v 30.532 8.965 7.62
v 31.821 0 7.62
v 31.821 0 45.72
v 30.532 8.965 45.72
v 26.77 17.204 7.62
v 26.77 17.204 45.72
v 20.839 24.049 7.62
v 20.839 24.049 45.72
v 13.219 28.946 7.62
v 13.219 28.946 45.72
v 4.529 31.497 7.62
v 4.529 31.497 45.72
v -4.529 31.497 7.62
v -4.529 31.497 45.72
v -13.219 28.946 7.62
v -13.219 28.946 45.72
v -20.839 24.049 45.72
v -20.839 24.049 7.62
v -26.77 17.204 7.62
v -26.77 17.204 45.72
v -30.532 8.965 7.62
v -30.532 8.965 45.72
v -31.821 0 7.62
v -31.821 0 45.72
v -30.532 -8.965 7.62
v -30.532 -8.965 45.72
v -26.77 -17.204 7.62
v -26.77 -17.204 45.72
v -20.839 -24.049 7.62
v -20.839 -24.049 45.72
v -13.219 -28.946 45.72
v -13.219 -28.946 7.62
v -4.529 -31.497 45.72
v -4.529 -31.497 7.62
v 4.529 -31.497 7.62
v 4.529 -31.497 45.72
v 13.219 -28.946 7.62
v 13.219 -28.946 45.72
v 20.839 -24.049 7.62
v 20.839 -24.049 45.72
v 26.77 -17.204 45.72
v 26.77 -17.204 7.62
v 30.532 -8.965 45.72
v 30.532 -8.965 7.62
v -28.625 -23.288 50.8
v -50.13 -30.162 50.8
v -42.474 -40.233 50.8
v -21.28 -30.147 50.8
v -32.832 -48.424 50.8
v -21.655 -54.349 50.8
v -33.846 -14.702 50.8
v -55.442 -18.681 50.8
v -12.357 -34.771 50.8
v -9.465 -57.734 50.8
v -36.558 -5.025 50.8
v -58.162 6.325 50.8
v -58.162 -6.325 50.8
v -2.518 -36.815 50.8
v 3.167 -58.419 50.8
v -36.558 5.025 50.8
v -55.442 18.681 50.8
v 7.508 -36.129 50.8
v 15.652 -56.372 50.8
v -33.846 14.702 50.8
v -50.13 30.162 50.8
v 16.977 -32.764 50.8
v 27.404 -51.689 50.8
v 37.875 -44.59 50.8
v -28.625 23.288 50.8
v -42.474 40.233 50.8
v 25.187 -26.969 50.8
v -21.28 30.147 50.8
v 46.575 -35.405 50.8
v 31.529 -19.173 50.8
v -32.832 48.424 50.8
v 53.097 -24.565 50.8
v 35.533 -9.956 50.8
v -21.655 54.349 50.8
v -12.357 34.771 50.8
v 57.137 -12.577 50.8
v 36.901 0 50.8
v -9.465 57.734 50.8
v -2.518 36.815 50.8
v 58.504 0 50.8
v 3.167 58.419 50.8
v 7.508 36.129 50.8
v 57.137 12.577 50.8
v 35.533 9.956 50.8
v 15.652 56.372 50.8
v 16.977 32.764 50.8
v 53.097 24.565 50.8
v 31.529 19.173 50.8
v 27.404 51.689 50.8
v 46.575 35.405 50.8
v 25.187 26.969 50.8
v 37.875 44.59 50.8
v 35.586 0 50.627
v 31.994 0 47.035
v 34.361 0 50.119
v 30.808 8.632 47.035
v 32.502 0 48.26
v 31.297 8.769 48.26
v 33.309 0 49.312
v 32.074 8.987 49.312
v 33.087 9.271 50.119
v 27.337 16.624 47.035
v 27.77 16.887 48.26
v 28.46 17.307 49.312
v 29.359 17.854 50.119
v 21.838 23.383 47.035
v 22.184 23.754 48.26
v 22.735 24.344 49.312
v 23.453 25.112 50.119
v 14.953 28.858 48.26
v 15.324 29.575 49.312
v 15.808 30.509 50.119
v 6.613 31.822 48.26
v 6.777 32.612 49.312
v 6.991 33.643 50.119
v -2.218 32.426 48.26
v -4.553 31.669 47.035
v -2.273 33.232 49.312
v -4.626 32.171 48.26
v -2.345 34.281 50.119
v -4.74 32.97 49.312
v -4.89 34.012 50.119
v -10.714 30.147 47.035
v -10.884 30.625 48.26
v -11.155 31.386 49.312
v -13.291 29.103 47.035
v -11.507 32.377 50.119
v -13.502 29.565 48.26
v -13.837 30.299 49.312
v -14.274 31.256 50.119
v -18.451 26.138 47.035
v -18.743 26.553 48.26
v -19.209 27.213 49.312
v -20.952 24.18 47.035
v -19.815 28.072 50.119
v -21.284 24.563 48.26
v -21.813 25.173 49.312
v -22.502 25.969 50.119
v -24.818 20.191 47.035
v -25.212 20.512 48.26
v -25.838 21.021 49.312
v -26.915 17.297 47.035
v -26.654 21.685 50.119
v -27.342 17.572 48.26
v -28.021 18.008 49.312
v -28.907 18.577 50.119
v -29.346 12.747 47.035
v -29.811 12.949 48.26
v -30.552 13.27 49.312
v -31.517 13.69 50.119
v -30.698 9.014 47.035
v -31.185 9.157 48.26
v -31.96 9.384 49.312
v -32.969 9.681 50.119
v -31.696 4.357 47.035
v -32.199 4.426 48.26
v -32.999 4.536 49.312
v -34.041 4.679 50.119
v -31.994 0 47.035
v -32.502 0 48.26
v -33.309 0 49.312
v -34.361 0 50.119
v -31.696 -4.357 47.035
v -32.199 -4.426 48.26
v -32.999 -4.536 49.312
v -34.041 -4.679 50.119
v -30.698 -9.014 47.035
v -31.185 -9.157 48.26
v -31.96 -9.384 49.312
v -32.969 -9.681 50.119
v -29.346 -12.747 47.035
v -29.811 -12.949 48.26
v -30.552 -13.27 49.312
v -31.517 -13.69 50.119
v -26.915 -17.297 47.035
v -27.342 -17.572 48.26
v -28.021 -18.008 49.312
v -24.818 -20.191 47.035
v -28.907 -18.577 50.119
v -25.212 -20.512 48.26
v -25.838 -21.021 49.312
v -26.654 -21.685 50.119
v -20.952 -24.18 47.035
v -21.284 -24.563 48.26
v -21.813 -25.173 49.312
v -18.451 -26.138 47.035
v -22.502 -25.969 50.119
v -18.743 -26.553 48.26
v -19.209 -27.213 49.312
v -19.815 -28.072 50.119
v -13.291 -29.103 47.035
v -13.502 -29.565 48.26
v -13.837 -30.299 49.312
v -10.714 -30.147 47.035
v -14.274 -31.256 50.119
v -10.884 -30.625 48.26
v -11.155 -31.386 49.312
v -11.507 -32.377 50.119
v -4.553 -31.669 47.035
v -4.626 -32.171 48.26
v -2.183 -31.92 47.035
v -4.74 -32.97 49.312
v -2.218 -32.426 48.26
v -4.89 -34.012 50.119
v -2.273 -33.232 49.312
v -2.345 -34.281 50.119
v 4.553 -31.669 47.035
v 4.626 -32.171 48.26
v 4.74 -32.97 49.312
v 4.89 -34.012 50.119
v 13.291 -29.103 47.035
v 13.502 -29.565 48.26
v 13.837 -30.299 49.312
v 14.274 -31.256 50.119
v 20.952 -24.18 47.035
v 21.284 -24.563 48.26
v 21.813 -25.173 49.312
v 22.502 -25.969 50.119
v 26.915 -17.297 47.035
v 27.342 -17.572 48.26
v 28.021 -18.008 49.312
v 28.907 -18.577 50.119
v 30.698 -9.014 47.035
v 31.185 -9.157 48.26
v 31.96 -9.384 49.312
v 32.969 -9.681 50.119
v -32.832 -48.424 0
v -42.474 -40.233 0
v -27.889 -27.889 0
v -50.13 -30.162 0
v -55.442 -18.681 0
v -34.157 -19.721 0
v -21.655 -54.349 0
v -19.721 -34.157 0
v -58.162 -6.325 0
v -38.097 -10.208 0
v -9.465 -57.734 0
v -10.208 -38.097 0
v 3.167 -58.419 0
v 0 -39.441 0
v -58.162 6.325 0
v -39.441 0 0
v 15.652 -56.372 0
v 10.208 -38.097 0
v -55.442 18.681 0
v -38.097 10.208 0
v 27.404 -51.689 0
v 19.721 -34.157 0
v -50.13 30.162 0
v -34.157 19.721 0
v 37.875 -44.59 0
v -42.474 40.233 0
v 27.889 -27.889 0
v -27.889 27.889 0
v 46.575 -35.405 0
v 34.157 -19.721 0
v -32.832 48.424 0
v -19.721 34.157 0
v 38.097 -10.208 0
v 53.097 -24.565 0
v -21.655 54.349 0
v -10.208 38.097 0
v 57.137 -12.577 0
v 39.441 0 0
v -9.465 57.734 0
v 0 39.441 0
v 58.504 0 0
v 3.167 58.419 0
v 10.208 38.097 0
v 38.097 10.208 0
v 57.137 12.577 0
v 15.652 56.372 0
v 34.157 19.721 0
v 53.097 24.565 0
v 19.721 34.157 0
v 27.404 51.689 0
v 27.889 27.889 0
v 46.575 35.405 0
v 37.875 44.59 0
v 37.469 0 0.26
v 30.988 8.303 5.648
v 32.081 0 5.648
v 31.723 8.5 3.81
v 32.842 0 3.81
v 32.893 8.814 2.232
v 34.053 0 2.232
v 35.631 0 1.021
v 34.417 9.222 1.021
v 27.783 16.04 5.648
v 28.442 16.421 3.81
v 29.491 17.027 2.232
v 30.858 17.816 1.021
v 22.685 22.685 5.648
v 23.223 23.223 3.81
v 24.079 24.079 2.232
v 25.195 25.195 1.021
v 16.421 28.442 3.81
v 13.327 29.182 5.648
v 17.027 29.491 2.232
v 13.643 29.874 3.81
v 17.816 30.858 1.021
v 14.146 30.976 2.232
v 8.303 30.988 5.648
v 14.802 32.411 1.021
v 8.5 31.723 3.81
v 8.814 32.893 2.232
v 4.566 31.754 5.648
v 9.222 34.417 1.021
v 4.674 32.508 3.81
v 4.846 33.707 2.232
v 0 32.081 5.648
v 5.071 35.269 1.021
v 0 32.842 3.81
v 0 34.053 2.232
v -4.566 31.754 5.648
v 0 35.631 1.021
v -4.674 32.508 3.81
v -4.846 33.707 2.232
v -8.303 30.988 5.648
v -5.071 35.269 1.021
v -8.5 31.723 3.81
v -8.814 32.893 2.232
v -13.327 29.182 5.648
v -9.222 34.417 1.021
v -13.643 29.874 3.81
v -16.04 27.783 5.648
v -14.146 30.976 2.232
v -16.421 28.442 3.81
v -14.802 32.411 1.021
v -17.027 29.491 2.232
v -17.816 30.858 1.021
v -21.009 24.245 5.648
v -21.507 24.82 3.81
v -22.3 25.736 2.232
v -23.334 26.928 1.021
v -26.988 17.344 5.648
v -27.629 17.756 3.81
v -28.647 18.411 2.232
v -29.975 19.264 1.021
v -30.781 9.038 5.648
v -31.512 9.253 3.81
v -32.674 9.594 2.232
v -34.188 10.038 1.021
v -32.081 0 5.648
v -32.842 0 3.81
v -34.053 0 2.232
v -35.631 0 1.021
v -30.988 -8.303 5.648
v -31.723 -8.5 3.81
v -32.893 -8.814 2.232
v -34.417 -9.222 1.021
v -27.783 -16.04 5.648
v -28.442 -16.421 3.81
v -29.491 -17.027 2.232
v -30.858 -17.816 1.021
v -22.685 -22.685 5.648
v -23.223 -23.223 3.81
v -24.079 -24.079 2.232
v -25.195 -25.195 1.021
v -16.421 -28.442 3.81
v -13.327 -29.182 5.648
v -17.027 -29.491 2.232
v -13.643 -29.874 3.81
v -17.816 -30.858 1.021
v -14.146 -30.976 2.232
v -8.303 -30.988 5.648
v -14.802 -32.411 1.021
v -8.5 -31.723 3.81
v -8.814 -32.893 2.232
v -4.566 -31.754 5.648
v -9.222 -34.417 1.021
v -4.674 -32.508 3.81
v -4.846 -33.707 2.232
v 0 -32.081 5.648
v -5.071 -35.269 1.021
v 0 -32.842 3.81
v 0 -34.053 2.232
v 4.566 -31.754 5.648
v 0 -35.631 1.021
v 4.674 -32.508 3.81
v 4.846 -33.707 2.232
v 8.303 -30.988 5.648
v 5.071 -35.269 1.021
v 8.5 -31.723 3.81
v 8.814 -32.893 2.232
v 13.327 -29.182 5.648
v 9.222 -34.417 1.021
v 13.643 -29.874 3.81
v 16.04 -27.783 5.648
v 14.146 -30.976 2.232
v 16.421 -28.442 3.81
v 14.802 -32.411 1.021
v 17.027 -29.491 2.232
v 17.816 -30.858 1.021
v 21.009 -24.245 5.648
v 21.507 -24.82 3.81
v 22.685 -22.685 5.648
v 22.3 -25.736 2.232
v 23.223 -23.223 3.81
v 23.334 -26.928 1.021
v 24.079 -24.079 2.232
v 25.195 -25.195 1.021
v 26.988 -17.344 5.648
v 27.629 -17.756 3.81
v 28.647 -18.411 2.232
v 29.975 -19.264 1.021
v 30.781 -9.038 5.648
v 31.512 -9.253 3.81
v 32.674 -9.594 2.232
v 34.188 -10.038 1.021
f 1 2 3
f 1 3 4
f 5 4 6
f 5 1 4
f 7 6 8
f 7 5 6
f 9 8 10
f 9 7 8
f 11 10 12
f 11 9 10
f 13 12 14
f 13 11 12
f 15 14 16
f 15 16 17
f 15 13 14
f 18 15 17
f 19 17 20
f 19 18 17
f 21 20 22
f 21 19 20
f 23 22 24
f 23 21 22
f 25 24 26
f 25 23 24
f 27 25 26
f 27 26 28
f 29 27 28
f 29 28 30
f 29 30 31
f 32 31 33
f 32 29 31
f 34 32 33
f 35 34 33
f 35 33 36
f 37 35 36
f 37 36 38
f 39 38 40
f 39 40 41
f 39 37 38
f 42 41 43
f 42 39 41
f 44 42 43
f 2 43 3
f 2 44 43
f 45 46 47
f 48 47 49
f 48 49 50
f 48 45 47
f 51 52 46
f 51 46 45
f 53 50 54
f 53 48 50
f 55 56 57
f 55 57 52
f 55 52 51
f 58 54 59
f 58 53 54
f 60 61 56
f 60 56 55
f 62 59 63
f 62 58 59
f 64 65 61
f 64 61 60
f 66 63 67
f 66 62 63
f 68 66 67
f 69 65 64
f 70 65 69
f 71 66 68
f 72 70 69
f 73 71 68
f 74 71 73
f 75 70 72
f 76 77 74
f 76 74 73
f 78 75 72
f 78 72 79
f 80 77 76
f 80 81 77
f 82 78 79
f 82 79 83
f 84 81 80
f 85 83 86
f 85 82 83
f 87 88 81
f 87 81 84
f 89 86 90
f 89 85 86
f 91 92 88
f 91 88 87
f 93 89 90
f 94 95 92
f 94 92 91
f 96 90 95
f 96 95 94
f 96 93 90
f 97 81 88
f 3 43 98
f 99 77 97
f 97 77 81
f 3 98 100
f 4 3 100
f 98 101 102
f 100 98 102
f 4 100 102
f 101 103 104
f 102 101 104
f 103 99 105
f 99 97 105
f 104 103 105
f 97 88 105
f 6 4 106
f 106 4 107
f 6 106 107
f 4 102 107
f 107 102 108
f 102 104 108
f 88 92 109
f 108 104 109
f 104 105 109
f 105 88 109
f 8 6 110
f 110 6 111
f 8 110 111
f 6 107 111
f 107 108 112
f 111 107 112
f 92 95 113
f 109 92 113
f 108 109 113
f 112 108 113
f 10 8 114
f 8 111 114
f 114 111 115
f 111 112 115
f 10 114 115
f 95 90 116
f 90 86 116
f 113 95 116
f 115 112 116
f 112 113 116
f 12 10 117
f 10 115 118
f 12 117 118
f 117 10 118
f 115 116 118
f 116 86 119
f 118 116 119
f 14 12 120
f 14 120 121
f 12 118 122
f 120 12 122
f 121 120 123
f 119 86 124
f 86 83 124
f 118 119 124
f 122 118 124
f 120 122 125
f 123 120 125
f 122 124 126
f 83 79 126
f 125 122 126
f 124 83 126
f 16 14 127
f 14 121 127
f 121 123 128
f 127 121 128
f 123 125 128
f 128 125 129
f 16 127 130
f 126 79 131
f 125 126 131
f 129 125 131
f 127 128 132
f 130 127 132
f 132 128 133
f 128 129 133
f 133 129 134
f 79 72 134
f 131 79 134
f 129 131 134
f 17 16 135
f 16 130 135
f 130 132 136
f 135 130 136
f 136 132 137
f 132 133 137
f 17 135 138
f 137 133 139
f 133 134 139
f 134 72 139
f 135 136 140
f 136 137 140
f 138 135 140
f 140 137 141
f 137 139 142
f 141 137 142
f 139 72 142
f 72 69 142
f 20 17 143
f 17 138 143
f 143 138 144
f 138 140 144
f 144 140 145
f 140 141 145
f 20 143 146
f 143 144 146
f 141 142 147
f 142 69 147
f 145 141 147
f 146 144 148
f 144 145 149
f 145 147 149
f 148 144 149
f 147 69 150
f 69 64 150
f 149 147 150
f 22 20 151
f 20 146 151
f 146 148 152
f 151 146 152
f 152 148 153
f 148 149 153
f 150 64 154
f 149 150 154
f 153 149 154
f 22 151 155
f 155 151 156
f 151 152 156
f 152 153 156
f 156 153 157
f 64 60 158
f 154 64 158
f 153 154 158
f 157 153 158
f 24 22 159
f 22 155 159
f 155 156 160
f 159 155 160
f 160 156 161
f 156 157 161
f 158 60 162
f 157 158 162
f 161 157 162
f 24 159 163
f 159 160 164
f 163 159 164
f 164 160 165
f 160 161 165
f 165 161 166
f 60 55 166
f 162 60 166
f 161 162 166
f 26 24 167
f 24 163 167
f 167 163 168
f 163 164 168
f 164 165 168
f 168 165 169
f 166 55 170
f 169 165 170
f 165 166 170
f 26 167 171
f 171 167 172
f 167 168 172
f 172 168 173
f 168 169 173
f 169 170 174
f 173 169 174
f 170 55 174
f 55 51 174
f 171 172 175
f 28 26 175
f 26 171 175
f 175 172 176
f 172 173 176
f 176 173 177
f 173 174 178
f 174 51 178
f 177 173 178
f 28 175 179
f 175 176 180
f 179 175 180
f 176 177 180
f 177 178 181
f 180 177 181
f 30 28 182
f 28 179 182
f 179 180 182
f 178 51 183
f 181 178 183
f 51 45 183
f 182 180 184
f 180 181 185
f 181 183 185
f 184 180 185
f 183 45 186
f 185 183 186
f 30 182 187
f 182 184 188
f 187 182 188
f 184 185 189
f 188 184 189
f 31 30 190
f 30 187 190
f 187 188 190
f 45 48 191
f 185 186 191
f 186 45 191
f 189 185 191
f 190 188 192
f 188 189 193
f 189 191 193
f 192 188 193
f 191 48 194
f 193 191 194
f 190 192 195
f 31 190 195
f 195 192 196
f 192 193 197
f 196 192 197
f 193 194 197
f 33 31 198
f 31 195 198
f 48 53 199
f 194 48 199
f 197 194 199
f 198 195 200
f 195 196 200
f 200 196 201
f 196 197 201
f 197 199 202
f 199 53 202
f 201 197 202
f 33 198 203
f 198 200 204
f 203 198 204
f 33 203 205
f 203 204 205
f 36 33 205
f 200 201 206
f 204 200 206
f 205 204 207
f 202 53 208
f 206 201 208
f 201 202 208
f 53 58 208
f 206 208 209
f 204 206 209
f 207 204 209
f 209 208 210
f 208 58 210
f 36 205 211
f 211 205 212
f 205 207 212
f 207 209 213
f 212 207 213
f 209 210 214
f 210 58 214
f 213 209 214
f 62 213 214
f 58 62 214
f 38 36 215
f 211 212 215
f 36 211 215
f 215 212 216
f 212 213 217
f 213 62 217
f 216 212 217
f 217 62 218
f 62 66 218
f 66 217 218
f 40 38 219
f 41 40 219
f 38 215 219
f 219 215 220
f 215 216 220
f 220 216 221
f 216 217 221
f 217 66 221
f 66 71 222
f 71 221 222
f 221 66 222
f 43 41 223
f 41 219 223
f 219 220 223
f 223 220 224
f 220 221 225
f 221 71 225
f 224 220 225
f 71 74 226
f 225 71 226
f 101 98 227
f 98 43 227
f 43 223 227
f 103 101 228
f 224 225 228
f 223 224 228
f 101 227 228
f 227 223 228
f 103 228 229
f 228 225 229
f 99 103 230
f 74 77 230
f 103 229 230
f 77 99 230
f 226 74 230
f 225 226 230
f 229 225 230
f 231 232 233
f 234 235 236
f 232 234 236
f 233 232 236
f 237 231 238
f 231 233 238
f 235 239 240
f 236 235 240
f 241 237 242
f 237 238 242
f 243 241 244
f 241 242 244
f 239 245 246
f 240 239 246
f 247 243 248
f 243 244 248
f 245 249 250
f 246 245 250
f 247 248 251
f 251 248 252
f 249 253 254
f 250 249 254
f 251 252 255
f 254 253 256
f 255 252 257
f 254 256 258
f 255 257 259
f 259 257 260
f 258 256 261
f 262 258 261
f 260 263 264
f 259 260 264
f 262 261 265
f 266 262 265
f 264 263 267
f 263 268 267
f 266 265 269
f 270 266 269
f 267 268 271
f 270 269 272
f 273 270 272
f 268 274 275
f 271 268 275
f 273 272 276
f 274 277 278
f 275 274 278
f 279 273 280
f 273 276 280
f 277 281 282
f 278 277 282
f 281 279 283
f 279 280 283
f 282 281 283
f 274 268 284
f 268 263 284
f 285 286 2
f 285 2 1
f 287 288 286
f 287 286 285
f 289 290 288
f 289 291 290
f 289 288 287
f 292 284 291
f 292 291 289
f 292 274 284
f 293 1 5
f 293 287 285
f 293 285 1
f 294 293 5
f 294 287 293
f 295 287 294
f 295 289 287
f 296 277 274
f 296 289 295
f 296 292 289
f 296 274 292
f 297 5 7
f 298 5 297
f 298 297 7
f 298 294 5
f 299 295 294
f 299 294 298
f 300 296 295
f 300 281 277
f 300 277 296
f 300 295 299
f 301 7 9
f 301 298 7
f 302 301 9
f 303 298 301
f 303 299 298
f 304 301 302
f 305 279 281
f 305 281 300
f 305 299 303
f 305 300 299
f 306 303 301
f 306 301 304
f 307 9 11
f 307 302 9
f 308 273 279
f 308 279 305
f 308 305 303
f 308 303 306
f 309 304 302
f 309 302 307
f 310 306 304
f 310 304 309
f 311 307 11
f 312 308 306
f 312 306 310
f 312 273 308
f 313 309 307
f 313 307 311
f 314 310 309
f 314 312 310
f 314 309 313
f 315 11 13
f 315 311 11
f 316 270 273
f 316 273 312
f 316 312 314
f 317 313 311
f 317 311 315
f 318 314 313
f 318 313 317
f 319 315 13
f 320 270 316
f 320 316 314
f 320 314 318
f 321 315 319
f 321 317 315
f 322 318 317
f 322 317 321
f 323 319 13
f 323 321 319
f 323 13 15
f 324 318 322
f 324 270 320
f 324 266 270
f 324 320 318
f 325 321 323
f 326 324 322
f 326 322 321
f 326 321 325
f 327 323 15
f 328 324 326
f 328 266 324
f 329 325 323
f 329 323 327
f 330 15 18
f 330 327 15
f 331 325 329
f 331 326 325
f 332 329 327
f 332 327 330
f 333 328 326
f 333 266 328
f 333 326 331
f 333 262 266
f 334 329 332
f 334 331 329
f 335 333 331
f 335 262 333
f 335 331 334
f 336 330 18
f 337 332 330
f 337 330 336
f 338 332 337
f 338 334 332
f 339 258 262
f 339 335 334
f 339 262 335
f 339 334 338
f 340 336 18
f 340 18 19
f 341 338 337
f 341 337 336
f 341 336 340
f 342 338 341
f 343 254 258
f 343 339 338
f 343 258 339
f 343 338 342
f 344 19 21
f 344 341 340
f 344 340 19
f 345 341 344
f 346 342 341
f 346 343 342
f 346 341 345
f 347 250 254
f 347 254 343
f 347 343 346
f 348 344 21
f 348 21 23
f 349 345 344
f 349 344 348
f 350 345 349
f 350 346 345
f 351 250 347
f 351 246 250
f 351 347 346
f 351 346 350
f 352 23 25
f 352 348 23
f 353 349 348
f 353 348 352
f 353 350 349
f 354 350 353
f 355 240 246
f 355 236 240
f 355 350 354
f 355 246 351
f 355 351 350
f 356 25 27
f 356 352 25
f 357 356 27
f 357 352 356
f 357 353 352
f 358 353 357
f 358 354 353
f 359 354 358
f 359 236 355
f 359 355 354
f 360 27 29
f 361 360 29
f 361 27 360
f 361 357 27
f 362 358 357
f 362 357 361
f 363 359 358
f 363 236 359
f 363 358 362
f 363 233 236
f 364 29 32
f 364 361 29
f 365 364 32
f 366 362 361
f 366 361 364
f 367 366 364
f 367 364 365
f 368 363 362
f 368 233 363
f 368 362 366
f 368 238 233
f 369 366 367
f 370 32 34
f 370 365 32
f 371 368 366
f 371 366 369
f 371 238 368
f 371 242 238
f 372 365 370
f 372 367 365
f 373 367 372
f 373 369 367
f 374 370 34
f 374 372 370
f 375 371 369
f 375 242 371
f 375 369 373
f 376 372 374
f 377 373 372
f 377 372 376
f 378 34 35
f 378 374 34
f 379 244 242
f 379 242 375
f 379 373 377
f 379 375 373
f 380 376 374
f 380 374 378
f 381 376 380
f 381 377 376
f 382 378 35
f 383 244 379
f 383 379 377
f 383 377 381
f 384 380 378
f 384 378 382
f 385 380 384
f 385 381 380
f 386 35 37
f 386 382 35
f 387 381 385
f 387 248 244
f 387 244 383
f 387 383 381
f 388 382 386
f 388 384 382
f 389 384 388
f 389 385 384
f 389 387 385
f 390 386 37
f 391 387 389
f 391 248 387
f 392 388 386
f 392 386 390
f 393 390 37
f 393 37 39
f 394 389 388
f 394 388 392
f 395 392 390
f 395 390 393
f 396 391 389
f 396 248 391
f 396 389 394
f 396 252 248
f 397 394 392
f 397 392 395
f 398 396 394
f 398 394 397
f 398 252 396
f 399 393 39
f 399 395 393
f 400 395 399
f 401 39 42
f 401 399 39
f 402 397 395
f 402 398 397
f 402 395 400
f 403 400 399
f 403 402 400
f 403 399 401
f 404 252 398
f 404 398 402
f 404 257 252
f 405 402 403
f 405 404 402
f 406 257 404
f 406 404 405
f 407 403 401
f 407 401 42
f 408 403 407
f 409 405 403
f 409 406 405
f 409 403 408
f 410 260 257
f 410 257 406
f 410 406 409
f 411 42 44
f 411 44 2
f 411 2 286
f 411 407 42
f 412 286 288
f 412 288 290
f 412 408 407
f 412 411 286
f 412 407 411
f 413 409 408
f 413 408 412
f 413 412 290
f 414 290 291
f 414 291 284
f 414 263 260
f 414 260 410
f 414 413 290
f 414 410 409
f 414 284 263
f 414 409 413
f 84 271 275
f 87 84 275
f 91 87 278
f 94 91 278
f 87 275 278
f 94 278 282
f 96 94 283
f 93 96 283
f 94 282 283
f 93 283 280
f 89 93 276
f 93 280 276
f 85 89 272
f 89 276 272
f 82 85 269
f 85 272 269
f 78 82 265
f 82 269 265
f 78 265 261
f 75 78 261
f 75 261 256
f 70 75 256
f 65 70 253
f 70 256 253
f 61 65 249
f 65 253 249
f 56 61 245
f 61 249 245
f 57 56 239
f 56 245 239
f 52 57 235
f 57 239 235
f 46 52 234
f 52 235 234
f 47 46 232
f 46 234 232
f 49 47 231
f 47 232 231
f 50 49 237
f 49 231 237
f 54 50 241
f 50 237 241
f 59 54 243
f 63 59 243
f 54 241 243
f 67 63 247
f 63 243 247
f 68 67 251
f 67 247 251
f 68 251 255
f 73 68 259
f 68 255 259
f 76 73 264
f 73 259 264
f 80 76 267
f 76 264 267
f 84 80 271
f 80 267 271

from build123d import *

# Parameters (mm, degrees)
F0_R     = 58.504478
F0_R_2   = 31.821293
F1_DEPTH = 50.8
F2_R     = 5.08
F3_R     = 7.62


with BuildPart() as f1:
    # F0 (on Top) → F1 (new body)
    with BuildSketch(Plane.XY):
        Circle(F0_R)
        Circle(F0_R_2, mode=Mode.SUBTRACT)
    extrude(amount=F1_DEPTH)

    # F2
    f2_edges = [f1.edges().sort_by_distance(p)[0] for p in [
        (-31.821293, 0, 50.8),
    ]]
    fillet(f2_edges, radius=F2_R)

    # F3
    f3_edges = [f1.edges().sort_by_distance(p)[0] for p in [
        (-31.821293, 0, 0),
    ]]
    fillet(f3_edges, radius=F3_R)


solid = f1.part
